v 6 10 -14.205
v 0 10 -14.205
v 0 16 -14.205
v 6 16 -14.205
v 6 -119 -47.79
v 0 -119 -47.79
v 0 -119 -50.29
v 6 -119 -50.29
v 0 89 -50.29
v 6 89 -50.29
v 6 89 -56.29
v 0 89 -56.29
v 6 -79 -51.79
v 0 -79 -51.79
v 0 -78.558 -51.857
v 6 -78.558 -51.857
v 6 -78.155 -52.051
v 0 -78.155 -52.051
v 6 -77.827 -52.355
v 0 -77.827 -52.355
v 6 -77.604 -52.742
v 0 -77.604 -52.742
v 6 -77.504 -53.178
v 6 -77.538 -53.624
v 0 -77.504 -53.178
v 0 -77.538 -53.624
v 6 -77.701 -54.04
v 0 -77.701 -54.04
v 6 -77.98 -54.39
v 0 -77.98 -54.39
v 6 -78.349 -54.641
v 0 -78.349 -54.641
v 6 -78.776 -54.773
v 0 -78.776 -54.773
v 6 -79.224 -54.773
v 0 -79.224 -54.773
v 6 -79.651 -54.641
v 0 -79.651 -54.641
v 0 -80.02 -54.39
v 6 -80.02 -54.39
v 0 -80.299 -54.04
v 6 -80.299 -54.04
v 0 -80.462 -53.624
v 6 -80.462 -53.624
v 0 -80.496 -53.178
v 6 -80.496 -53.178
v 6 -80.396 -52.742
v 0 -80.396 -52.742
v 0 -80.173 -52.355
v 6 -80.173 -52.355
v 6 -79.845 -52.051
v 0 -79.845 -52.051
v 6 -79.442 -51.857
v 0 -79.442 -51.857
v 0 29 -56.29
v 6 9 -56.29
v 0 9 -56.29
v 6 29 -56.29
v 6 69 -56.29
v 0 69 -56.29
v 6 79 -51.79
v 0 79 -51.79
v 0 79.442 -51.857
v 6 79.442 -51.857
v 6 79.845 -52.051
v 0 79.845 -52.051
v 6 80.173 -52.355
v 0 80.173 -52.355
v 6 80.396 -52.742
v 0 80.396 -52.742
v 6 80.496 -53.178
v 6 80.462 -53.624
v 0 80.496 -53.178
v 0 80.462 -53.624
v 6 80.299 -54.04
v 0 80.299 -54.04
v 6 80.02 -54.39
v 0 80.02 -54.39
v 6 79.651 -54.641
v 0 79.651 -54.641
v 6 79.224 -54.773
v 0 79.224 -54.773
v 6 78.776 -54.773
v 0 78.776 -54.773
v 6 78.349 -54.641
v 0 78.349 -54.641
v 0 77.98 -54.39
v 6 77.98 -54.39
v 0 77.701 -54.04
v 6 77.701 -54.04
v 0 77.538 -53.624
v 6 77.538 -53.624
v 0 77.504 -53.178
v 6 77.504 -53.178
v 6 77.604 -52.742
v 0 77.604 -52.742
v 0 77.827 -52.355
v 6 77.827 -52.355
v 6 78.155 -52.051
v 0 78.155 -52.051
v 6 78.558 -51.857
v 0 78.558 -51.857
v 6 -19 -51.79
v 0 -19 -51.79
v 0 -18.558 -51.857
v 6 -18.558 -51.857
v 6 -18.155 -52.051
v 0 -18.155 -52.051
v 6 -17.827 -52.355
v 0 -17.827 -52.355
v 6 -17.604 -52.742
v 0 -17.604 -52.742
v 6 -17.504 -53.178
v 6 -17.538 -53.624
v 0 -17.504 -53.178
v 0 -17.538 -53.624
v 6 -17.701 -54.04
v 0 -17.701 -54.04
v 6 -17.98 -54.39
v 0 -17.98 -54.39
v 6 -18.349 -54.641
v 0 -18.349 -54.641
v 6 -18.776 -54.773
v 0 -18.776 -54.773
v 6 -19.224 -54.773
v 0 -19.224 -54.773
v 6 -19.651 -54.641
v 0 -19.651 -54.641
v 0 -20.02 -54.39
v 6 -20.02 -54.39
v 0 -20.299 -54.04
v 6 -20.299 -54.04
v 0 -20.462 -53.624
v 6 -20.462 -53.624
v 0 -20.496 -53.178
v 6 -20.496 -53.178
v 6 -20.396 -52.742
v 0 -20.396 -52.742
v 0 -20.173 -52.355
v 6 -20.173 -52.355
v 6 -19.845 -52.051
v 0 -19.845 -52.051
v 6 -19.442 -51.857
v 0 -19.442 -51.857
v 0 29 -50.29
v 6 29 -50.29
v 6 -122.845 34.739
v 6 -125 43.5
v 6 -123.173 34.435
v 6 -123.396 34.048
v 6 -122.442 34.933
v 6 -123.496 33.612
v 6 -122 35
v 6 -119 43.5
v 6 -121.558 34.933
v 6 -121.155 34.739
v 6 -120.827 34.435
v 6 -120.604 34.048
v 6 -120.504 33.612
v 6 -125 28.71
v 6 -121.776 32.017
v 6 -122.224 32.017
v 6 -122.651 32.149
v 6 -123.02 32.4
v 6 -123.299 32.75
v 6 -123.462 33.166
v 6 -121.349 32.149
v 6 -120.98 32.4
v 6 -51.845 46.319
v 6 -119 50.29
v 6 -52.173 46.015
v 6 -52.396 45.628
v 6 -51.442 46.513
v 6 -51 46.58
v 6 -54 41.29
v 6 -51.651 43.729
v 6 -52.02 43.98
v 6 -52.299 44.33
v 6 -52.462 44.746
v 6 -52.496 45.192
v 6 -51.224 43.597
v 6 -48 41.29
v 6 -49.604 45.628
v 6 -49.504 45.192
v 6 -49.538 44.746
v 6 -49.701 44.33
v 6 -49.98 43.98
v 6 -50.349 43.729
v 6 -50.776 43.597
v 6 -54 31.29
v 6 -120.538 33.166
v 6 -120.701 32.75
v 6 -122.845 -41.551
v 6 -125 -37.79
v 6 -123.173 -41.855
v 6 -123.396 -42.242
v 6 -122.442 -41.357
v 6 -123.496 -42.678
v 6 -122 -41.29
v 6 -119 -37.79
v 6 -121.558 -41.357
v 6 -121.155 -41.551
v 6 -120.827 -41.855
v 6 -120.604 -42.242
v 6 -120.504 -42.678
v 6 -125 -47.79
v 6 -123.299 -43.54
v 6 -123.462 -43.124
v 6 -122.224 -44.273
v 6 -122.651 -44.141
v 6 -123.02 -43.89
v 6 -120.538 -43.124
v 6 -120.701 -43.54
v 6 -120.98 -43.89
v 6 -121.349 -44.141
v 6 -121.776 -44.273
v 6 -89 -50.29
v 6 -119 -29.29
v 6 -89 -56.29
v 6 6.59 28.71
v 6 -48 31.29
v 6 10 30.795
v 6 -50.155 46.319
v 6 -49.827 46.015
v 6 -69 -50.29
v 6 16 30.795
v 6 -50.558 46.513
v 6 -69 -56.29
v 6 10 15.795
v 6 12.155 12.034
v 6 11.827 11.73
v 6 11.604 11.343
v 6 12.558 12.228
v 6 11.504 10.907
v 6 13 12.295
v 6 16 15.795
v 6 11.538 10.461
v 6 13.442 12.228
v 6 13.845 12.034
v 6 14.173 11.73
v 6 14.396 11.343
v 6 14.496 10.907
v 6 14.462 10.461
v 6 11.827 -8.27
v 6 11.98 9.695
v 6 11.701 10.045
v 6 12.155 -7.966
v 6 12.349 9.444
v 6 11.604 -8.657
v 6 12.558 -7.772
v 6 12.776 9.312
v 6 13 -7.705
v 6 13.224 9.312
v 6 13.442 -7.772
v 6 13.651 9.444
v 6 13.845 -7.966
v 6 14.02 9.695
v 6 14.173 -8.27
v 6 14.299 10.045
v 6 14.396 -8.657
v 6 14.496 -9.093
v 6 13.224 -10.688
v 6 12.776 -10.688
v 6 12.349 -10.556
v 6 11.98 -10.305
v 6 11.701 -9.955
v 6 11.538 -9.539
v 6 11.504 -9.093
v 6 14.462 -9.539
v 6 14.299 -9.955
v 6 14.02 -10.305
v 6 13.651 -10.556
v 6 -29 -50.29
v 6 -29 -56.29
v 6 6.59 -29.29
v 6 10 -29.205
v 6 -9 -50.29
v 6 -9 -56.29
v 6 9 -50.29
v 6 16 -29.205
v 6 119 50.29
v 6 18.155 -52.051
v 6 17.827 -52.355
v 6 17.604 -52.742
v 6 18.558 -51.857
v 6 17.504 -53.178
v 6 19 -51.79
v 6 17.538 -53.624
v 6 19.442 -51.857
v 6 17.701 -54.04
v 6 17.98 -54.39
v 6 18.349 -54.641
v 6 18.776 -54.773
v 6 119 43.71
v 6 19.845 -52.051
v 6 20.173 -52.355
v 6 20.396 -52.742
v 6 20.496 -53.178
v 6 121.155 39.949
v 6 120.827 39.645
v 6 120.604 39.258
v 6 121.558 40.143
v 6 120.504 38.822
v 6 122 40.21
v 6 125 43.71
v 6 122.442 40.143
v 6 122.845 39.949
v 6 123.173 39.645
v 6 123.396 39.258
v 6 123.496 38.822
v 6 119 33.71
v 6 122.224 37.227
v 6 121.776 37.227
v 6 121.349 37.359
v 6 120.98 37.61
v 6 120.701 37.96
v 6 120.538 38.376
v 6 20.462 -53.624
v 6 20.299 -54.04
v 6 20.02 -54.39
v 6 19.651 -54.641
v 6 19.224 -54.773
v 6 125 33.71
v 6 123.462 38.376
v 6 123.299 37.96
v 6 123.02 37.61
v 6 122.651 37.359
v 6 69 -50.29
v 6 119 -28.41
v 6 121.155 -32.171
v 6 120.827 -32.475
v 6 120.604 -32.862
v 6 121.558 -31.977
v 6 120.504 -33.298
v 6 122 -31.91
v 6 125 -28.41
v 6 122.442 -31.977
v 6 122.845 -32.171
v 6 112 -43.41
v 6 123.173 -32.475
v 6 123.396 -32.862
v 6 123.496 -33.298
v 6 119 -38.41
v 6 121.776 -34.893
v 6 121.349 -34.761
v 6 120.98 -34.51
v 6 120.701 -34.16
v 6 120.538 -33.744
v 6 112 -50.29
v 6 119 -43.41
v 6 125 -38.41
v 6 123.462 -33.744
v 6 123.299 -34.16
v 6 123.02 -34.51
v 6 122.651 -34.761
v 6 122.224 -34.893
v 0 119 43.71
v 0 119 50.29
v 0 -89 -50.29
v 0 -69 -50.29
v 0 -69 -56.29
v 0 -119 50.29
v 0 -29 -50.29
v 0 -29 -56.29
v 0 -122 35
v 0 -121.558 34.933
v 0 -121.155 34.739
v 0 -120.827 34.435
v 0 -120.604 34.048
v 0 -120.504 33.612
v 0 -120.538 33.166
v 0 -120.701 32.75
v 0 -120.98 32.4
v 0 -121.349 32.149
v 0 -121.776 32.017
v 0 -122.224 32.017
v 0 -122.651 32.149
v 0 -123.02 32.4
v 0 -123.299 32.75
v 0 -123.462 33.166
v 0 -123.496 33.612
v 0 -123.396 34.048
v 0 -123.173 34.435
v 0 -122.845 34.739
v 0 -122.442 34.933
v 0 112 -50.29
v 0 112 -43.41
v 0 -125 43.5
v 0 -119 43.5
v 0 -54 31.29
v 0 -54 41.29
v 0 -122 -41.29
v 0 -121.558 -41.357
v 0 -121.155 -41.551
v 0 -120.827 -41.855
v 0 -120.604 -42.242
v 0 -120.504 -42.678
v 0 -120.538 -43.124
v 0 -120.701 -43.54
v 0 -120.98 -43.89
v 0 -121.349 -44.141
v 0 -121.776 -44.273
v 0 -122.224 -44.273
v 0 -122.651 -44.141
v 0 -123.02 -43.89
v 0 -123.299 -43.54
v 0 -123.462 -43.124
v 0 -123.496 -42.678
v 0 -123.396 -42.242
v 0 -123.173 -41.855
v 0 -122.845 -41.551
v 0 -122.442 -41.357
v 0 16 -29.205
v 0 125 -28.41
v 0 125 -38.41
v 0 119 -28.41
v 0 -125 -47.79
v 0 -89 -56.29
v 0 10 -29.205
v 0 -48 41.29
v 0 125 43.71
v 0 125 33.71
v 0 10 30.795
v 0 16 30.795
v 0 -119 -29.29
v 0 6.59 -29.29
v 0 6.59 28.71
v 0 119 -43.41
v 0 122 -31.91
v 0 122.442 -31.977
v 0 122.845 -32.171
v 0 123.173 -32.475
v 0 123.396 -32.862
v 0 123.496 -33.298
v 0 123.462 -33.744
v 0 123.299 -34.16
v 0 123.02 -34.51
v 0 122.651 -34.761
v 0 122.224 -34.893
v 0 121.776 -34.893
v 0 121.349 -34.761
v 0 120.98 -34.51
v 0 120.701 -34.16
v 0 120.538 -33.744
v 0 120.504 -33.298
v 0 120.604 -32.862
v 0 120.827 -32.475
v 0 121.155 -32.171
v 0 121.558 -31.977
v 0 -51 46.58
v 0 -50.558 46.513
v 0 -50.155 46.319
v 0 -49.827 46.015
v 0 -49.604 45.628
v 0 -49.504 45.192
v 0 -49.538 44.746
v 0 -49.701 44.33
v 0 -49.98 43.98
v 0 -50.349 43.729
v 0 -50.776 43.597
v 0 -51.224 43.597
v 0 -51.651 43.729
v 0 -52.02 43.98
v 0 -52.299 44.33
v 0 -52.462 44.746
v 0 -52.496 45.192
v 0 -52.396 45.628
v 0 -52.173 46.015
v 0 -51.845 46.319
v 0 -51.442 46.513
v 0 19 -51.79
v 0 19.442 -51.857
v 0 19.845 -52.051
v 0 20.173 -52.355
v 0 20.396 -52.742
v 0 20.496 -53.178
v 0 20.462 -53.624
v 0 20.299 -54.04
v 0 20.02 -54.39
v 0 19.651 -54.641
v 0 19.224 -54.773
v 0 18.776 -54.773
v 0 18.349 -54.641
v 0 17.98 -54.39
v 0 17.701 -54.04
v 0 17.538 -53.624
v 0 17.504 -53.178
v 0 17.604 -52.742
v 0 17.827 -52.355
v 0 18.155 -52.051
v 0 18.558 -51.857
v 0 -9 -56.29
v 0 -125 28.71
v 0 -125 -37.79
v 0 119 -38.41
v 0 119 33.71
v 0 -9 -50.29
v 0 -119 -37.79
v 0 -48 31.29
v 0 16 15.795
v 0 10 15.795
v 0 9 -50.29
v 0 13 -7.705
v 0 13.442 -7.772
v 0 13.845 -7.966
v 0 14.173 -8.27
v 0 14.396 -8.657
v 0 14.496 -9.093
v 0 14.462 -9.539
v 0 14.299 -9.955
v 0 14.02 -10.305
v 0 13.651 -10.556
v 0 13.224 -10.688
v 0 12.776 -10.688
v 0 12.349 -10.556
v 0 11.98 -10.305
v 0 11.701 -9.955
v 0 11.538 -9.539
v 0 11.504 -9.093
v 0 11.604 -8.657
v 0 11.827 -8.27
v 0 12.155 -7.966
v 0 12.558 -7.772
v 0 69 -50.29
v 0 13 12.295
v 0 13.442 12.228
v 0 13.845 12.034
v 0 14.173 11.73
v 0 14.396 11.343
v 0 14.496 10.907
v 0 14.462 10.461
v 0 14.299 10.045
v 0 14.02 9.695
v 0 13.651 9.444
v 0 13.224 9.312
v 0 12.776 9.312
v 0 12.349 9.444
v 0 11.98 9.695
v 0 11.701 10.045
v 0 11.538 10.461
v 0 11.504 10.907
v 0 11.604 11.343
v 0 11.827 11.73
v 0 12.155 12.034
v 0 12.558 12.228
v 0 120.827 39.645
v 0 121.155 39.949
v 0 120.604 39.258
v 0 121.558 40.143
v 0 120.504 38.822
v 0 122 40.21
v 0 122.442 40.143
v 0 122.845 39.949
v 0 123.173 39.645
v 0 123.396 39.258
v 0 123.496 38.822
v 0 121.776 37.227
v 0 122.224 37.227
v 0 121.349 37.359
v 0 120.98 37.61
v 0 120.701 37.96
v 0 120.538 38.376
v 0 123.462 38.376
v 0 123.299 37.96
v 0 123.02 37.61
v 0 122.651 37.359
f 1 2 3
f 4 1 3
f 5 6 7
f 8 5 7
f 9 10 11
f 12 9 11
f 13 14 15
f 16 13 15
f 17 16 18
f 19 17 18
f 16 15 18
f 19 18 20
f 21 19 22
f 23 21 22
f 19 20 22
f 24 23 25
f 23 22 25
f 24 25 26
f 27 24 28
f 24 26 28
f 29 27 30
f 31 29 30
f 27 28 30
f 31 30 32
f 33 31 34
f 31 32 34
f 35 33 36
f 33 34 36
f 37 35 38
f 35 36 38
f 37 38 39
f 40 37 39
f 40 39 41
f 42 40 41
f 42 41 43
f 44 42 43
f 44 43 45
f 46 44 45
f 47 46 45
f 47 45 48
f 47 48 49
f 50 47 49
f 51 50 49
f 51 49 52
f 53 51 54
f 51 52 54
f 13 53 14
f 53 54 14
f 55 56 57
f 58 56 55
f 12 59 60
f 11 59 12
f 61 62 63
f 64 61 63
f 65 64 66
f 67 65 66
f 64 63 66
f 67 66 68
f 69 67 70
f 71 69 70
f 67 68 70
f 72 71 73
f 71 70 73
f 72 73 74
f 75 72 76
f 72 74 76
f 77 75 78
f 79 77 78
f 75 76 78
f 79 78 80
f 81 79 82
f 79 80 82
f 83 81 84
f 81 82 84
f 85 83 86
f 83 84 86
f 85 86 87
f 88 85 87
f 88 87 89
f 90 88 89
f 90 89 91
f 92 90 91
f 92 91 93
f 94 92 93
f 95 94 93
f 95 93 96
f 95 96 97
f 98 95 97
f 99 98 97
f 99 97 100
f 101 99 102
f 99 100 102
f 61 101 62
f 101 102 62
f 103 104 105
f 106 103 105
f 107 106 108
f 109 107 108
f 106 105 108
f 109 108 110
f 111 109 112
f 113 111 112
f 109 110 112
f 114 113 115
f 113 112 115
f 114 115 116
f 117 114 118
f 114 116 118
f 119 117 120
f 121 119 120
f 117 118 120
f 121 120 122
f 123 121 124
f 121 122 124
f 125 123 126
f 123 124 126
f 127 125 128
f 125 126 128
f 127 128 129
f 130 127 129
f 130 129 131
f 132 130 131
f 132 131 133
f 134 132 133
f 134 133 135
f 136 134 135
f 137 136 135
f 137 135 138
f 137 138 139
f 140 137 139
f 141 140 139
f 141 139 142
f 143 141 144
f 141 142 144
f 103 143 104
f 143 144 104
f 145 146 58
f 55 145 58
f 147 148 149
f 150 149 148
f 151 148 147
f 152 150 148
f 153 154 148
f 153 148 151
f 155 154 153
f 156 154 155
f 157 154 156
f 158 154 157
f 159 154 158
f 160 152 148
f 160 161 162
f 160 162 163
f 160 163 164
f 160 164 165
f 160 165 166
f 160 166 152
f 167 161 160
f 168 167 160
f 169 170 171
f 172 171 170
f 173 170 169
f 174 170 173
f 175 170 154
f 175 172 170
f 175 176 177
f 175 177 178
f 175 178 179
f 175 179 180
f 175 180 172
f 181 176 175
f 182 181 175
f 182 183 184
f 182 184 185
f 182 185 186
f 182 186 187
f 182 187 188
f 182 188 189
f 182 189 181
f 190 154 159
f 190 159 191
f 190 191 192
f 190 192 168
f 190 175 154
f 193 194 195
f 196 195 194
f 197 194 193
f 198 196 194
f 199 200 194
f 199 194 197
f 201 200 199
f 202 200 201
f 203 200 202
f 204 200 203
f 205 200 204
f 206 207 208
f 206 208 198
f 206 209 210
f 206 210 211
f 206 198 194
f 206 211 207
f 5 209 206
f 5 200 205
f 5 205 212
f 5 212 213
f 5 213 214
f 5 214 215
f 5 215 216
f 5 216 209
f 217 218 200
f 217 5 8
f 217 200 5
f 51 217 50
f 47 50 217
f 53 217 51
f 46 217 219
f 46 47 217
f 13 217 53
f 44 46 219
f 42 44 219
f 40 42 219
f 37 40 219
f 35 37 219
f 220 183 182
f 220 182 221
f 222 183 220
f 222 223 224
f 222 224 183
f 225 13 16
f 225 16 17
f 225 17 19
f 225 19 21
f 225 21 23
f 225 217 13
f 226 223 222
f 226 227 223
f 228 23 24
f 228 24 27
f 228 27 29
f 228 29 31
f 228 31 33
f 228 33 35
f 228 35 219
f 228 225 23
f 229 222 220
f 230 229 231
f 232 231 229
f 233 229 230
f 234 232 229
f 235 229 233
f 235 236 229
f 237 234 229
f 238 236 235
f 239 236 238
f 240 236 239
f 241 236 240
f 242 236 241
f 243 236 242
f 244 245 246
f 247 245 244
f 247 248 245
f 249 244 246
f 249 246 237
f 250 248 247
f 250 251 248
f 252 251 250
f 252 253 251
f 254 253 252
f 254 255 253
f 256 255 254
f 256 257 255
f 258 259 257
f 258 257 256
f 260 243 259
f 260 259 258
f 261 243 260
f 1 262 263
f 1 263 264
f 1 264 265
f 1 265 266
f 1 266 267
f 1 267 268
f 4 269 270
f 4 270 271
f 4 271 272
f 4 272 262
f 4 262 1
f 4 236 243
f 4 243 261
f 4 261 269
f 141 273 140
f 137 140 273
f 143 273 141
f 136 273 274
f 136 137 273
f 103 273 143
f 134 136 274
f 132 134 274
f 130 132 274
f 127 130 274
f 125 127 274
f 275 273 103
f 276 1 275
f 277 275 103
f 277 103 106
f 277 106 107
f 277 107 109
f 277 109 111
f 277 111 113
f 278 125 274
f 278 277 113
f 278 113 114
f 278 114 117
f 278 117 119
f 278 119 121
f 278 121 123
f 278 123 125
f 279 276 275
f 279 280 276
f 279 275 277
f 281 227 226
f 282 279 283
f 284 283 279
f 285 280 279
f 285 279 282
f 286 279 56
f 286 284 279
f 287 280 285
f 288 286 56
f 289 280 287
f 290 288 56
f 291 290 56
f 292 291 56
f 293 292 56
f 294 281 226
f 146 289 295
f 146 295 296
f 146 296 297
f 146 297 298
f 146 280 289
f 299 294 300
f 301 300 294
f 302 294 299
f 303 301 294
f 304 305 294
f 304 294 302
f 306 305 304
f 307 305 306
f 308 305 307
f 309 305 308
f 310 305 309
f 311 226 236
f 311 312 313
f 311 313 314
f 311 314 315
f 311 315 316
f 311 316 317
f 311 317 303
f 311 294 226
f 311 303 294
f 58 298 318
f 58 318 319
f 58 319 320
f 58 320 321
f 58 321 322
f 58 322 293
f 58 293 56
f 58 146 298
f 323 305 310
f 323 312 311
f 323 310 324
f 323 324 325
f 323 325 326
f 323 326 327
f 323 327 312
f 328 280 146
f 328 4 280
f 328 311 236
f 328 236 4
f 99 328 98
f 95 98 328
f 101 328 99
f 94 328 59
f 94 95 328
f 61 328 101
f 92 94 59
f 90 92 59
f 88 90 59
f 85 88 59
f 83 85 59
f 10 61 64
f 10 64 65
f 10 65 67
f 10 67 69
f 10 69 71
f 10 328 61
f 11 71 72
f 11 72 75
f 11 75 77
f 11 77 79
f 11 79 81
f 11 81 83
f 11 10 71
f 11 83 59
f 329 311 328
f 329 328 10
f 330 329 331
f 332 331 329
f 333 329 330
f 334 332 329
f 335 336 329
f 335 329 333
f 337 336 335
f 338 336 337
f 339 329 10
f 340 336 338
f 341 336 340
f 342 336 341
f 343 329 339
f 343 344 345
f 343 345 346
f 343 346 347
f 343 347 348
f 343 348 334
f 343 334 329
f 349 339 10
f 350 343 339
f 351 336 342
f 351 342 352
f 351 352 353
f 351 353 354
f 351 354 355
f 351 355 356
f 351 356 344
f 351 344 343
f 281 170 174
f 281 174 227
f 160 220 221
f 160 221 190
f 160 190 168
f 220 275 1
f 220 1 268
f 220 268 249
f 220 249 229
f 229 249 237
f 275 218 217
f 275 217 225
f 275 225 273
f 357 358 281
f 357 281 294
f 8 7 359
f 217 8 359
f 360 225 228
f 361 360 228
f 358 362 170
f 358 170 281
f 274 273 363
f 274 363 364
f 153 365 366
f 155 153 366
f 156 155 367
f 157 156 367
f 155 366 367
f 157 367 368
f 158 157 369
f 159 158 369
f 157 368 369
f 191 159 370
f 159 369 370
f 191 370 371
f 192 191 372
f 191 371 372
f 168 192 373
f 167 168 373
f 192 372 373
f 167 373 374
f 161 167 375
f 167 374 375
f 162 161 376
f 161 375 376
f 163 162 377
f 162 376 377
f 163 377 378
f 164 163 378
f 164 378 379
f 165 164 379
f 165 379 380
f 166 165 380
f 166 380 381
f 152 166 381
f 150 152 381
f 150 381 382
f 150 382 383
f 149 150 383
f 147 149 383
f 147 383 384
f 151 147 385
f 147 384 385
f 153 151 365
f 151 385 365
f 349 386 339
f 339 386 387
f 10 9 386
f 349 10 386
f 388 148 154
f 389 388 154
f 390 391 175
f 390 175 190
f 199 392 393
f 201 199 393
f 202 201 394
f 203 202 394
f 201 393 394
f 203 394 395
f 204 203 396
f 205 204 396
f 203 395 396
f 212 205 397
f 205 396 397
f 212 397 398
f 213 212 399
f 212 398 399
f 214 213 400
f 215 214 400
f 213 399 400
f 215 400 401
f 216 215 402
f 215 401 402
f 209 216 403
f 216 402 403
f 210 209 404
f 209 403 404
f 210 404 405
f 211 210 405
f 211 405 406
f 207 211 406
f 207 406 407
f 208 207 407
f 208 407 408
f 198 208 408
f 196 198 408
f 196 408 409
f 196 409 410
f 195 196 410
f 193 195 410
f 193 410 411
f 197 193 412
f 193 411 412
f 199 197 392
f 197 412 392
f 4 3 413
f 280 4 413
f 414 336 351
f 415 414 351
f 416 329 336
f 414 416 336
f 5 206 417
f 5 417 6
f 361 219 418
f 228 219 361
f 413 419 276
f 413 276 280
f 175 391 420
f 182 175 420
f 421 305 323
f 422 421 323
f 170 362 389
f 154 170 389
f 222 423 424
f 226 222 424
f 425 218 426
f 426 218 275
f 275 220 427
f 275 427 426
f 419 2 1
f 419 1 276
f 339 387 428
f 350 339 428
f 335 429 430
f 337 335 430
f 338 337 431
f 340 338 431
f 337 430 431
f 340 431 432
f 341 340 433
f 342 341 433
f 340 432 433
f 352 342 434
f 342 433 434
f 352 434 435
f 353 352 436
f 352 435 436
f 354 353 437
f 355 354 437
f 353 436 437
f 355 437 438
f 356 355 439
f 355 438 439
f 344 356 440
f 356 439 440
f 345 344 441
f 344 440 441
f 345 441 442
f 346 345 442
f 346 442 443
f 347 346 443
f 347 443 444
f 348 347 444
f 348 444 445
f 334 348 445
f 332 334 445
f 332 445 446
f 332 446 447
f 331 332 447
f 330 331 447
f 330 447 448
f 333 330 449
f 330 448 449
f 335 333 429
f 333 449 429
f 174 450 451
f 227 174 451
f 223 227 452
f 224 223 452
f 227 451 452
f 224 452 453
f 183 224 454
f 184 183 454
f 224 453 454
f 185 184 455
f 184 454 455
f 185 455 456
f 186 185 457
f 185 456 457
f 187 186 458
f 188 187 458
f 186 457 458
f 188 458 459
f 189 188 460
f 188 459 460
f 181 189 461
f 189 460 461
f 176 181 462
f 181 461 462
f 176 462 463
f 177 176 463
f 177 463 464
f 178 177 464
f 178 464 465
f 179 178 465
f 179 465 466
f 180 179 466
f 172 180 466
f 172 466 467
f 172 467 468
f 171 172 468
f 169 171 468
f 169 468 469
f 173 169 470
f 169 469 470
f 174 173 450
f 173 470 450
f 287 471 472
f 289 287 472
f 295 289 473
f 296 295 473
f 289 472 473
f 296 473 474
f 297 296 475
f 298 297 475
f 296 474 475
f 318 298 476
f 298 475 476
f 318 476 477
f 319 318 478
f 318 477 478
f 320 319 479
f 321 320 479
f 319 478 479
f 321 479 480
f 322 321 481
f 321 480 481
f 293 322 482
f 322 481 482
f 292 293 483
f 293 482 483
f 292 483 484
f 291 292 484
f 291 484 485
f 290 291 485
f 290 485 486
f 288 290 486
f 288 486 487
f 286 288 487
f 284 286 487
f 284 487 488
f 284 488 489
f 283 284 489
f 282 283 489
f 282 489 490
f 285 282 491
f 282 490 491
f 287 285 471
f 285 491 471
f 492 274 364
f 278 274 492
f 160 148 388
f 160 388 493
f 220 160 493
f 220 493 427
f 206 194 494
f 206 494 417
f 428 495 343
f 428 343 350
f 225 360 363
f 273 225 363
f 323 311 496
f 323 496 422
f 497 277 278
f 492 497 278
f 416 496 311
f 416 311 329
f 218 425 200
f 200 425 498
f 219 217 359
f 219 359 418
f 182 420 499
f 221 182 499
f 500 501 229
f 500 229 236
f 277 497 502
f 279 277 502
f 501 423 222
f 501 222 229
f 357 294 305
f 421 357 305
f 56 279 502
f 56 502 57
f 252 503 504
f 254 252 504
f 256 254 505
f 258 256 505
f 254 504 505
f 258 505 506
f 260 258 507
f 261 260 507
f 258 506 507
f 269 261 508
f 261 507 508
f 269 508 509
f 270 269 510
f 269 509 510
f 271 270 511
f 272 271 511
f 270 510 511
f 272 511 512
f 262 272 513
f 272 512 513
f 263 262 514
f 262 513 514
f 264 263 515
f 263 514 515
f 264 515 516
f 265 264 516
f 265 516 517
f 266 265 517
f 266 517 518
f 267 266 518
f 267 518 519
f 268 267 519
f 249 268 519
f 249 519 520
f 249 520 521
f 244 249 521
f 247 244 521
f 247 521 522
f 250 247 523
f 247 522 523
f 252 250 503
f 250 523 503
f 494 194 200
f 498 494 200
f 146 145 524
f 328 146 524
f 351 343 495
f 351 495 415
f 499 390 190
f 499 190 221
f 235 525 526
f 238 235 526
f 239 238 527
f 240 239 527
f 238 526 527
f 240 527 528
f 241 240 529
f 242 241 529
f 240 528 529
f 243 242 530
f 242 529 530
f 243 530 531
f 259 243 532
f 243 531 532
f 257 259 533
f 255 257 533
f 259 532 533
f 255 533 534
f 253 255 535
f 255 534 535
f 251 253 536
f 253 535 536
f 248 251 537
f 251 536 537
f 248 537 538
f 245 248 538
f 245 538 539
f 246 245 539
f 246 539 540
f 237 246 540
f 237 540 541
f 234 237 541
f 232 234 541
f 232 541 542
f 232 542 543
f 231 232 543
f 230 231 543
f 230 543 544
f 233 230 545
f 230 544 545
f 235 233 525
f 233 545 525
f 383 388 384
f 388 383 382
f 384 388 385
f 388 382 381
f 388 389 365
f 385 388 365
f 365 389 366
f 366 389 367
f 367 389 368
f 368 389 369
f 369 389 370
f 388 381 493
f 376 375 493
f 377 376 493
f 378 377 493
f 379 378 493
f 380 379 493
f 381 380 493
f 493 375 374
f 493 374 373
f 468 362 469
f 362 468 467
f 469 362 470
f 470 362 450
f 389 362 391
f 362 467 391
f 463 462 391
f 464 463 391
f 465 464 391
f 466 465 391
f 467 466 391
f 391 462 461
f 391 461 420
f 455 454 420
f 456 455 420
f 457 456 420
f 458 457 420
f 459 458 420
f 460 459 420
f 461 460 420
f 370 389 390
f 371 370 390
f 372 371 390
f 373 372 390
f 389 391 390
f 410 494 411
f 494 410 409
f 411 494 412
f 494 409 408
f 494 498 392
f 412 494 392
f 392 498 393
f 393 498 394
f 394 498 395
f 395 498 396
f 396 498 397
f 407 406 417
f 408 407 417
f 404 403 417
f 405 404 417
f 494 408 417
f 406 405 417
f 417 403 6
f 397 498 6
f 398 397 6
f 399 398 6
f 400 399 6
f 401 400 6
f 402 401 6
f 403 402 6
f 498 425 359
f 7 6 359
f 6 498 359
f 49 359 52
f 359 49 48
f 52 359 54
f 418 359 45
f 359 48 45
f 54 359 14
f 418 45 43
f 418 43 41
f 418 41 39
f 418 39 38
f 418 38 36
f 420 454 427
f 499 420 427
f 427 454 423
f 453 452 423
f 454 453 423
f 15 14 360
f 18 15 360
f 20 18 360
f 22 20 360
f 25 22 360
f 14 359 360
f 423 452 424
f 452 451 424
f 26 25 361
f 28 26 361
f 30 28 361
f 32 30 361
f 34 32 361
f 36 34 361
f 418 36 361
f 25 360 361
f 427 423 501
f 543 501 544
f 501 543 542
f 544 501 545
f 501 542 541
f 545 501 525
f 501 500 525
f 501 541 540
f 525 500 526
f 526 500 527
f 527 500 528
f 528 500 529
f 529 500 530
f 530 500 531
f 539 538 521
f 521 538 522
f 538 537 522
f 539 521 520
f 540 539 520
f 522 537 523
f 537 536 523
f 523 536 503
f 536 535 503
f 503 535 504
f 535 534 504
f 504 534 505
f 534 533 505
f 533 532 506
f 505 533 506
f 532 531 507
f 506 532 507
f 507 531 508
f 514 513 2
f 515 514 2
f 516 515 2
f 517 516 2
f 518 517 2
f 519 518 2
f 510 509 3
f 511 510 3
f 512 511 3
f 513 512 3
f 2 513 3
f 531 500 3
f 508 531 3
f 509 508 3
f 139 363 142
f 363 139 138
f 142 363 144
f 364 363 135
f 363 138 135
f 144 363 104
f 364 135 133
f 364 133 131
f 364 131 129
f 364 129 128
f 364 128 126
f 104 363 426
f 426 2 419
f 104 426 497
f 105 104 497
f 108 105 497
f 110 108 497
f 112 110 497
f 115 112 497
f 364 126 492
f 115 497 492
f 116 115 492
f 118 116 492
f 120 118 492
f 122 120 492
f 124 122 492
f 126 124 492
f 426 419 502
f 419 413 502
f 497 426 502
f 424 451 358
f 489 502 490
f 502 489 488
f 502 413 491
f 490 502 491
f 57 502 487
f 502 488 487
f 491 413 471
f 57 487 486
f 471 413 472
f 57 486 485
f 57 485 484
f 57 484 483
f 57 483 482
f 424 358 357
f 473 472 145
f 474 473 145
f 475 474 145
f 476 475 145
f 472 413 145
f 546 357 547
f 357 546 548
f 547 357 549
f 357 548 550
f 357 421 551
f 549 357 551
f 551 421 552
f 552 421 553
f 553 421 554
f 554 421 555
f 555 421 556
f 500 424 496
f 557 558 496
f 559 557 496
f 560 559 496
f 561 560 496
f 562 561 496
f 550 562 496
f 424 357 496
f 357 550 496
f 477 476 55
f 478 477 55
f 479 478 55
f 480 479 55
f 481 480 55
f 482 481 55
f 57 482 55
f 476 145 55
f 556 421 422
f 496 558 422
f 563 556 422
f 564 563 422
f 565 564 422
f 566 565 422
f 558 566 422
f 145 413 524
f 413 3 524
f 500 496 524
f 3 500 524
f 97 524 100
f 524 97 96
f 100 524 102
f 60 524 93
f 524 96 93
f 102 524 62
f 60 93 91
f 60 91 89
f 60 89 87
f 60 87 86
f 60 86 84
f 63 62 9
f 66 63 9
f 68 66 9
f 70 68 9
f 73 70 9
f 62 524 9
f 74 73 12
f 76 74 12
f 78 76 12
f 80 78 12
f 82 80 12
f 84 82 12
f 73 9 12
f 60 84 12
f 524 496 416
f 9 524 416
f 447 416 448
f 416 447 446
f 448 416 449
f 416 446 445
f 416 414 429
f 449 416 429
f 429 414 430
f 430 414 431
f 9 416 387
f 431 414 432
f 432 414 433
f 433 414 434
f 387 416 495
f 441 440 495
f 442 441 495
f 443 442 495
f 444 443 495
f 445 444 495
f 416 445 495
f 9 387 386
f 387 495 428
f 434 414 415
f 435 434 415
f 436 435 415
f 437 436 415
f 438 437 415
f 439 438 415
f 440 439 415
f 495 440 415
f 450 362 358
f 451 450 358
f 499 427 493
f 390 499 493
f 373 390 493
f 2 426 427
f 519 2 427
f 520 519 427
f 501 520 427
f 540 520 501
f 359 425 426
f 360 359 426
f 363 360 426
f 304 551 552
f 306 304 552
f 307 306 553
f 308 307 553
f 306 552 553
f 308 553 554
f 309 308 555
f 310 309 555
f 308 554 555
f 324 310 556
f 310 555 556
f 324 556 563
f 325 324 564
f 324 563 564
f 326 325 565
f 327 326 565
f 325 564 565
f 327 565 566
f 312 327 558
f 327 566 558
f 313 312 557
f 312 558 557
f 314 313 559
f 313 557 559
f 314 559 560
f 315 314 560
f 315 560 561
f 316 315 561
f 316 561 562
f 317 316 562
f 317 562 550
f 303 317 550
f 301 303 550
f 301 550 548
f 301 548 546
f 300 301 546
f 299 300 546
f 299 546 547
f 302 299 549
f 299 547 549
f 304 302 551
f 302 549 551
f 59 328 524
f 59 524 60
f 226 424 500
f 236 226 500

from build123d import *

# Parameters (mm, degrees)
ESQUISSE1_W             = 100.58
ESQUISSE1_H             = 238
ESQUISSE1_W_2           = 10
ESQUISSE1_H_2           = 6
ESQUISSE1_W_3           = 15
BOSS_EXTRU_1_DEPTH      = 6
ESQUISSE3_W             = 20
ESQUISSE3_H             = 6
ESQUISSE3_W_2           = 10
ESQUISSE3_W_3           = 6
ESQUISSE3_H_2           = 20
BOSS_EXTRU_5_DEPTH      = 6
ESQUISSE6_W             = 58
ESQUISSE6_H             = 131.59
ENL_V_MAT_EXTRU_2_DEPTH = 6
ESQUISSE7_W             = 6.88
ESQUISSE7_H             = 7
ENL_V_MAT_EXTRU_3_DEPTH = 6
ESQUISSE8_R             = 1.5
ENL_V_MAT_EXTRU_4_DEPTH = 6


with BuildPart() as part:
    # Esquisse1 → Boss.-Extru.1 (new body)
    with BuildSketch(Plane(origin=(0, 0, 0), x_dir=(0, 0, -1), z_dir=(1, 0, 0))):
        Rectangle(ESQUISSE1_W, ESQUISSE1_H)
        with Locations((-36.29, -51)):
            Rectangle(ESQUISSE1_W_2, ESQUISSE1_H_2, mode=Mode.SUBTRACT)
        with Locations((-23.295, 13)):
            Rectangle(ESQUISSE1_W_3, ESQUISSE1_H_2, mode=Mode.SUBTRACT)
        with Locations((21.705, 13)):
            Rectangle(ESQUISSE1_W_3, ESQUISSE1_H_2, mode=Mode.SUBTRACT)
    extrude(amount=BOSS_EXTRU_1_DEPTH)

    # Esquisse3 → Boss.-Extru.5 (add)
    with BuildSketch(Plane(origin=(6, 0, 0), x_dir=(0, 0, -1), z_dir=(1, 0, 0))):
        with Locations((-33.5, -122)):
            Rectangle(ESQUISSE3_W, ESQUISSE3_H)
        with Locations((42.79, -122)):
            Rectangle(ESQUISSE3_W_2, ESQUISSE3_H)
        with Locations((53.29, 19)):
            Rectangle(ESQUISSE3_W_3, ESQUISSE3_H_2)
        with Locations((53.29, 79)):
            Rectangle(ESQUISSE3_W_3, ESQUISSE3_H_2)
        with Locations((53.29, -79)):
            Rectangle(ESQUISSE3_W_3, ESQUISSE3_H_2)
        with Locations((53.29, -19)):
            Rectangle(ESQUISSE3_W_3, ESQUISSE3_H_2)
        with Locations((33.41, 122)):
            Rectangle(ESQUISSE3_W_2, ESQUISSE3_H)
        with Locations((-38.71, 122)):
            Rectangle(ESQUISSE3_W_2, ESQUISSE3_H)
    extrude(amount=-BOSS_EXTRU_5_DEPTH)

    # Esquisse6 → Enlèv. mat.-Extru.2 (cut)
    with BuildSketch(Plane(origin=(6, 0, 0), x_dir=(0, 0, -1), z_dir=(1, 0, 0))):
        with Locations((0.29, -59.205)):
            Rectangle(ESQUISSE6_W, ESQUISSE6_H)
    extrude(amount=-ENL_V_MAT_EXTRU_2_DEPTH, mode=Mode.SUBTRACT)

    # Esquisse7 → Enlèv. mat.-Extru.3 (cut)
    with BuildSketch(Plane.ZY):
        with Locations((-46.85, 115.5)):
            Rectangle(ESQUISSE7_W, ESQUISSE7_H)
    extrude(amount=-ENL_V_MAT_EXTRU_3_DEPTH, mode=Mode.SUBTRACT)

    # Esquisse8 → Enlèv. mat.-Extru.4 (cut)
    with BuildSketch(Plane.ZY):
        with Locations((-9.205, 13)):
            Circle(ESQUISSE8_R)
        with Locations((10.795, 13)):
            Circle(ESQUISSE8_R)
        with Locations((45.08, -51)):
            Circle(ESQUISSE8_R)
        with Locations((38.71, 122)):
            Circle(ESQUISSE8_R)
        with Locations((-33.41, 122)):
            Circle(ESQUISSE8_R)
        with Locations((33.5, -122)):
            Circle(ESQUISSE8_R)
        with Locations((-53.29, 79)):
            Circle(ESQUISSE8_R)
        with Locations((-42.79, -122)):
            Circle(ESQUISSE8_R)
        with Locations((-53.29, 19)):
            Circle(ESQUISSE8_R)
        with Locations((-53.29, -79)):
            Circle(ESQUISSE8_R)
        with Locations((-53.29, -19)):
            Circle(ESQUISSE8_R)
    extrude(amount=-ENL_V_MAT_EXTRU_4_DEPTH, mode=Mode.SUBTRACT)


solid = part.part
